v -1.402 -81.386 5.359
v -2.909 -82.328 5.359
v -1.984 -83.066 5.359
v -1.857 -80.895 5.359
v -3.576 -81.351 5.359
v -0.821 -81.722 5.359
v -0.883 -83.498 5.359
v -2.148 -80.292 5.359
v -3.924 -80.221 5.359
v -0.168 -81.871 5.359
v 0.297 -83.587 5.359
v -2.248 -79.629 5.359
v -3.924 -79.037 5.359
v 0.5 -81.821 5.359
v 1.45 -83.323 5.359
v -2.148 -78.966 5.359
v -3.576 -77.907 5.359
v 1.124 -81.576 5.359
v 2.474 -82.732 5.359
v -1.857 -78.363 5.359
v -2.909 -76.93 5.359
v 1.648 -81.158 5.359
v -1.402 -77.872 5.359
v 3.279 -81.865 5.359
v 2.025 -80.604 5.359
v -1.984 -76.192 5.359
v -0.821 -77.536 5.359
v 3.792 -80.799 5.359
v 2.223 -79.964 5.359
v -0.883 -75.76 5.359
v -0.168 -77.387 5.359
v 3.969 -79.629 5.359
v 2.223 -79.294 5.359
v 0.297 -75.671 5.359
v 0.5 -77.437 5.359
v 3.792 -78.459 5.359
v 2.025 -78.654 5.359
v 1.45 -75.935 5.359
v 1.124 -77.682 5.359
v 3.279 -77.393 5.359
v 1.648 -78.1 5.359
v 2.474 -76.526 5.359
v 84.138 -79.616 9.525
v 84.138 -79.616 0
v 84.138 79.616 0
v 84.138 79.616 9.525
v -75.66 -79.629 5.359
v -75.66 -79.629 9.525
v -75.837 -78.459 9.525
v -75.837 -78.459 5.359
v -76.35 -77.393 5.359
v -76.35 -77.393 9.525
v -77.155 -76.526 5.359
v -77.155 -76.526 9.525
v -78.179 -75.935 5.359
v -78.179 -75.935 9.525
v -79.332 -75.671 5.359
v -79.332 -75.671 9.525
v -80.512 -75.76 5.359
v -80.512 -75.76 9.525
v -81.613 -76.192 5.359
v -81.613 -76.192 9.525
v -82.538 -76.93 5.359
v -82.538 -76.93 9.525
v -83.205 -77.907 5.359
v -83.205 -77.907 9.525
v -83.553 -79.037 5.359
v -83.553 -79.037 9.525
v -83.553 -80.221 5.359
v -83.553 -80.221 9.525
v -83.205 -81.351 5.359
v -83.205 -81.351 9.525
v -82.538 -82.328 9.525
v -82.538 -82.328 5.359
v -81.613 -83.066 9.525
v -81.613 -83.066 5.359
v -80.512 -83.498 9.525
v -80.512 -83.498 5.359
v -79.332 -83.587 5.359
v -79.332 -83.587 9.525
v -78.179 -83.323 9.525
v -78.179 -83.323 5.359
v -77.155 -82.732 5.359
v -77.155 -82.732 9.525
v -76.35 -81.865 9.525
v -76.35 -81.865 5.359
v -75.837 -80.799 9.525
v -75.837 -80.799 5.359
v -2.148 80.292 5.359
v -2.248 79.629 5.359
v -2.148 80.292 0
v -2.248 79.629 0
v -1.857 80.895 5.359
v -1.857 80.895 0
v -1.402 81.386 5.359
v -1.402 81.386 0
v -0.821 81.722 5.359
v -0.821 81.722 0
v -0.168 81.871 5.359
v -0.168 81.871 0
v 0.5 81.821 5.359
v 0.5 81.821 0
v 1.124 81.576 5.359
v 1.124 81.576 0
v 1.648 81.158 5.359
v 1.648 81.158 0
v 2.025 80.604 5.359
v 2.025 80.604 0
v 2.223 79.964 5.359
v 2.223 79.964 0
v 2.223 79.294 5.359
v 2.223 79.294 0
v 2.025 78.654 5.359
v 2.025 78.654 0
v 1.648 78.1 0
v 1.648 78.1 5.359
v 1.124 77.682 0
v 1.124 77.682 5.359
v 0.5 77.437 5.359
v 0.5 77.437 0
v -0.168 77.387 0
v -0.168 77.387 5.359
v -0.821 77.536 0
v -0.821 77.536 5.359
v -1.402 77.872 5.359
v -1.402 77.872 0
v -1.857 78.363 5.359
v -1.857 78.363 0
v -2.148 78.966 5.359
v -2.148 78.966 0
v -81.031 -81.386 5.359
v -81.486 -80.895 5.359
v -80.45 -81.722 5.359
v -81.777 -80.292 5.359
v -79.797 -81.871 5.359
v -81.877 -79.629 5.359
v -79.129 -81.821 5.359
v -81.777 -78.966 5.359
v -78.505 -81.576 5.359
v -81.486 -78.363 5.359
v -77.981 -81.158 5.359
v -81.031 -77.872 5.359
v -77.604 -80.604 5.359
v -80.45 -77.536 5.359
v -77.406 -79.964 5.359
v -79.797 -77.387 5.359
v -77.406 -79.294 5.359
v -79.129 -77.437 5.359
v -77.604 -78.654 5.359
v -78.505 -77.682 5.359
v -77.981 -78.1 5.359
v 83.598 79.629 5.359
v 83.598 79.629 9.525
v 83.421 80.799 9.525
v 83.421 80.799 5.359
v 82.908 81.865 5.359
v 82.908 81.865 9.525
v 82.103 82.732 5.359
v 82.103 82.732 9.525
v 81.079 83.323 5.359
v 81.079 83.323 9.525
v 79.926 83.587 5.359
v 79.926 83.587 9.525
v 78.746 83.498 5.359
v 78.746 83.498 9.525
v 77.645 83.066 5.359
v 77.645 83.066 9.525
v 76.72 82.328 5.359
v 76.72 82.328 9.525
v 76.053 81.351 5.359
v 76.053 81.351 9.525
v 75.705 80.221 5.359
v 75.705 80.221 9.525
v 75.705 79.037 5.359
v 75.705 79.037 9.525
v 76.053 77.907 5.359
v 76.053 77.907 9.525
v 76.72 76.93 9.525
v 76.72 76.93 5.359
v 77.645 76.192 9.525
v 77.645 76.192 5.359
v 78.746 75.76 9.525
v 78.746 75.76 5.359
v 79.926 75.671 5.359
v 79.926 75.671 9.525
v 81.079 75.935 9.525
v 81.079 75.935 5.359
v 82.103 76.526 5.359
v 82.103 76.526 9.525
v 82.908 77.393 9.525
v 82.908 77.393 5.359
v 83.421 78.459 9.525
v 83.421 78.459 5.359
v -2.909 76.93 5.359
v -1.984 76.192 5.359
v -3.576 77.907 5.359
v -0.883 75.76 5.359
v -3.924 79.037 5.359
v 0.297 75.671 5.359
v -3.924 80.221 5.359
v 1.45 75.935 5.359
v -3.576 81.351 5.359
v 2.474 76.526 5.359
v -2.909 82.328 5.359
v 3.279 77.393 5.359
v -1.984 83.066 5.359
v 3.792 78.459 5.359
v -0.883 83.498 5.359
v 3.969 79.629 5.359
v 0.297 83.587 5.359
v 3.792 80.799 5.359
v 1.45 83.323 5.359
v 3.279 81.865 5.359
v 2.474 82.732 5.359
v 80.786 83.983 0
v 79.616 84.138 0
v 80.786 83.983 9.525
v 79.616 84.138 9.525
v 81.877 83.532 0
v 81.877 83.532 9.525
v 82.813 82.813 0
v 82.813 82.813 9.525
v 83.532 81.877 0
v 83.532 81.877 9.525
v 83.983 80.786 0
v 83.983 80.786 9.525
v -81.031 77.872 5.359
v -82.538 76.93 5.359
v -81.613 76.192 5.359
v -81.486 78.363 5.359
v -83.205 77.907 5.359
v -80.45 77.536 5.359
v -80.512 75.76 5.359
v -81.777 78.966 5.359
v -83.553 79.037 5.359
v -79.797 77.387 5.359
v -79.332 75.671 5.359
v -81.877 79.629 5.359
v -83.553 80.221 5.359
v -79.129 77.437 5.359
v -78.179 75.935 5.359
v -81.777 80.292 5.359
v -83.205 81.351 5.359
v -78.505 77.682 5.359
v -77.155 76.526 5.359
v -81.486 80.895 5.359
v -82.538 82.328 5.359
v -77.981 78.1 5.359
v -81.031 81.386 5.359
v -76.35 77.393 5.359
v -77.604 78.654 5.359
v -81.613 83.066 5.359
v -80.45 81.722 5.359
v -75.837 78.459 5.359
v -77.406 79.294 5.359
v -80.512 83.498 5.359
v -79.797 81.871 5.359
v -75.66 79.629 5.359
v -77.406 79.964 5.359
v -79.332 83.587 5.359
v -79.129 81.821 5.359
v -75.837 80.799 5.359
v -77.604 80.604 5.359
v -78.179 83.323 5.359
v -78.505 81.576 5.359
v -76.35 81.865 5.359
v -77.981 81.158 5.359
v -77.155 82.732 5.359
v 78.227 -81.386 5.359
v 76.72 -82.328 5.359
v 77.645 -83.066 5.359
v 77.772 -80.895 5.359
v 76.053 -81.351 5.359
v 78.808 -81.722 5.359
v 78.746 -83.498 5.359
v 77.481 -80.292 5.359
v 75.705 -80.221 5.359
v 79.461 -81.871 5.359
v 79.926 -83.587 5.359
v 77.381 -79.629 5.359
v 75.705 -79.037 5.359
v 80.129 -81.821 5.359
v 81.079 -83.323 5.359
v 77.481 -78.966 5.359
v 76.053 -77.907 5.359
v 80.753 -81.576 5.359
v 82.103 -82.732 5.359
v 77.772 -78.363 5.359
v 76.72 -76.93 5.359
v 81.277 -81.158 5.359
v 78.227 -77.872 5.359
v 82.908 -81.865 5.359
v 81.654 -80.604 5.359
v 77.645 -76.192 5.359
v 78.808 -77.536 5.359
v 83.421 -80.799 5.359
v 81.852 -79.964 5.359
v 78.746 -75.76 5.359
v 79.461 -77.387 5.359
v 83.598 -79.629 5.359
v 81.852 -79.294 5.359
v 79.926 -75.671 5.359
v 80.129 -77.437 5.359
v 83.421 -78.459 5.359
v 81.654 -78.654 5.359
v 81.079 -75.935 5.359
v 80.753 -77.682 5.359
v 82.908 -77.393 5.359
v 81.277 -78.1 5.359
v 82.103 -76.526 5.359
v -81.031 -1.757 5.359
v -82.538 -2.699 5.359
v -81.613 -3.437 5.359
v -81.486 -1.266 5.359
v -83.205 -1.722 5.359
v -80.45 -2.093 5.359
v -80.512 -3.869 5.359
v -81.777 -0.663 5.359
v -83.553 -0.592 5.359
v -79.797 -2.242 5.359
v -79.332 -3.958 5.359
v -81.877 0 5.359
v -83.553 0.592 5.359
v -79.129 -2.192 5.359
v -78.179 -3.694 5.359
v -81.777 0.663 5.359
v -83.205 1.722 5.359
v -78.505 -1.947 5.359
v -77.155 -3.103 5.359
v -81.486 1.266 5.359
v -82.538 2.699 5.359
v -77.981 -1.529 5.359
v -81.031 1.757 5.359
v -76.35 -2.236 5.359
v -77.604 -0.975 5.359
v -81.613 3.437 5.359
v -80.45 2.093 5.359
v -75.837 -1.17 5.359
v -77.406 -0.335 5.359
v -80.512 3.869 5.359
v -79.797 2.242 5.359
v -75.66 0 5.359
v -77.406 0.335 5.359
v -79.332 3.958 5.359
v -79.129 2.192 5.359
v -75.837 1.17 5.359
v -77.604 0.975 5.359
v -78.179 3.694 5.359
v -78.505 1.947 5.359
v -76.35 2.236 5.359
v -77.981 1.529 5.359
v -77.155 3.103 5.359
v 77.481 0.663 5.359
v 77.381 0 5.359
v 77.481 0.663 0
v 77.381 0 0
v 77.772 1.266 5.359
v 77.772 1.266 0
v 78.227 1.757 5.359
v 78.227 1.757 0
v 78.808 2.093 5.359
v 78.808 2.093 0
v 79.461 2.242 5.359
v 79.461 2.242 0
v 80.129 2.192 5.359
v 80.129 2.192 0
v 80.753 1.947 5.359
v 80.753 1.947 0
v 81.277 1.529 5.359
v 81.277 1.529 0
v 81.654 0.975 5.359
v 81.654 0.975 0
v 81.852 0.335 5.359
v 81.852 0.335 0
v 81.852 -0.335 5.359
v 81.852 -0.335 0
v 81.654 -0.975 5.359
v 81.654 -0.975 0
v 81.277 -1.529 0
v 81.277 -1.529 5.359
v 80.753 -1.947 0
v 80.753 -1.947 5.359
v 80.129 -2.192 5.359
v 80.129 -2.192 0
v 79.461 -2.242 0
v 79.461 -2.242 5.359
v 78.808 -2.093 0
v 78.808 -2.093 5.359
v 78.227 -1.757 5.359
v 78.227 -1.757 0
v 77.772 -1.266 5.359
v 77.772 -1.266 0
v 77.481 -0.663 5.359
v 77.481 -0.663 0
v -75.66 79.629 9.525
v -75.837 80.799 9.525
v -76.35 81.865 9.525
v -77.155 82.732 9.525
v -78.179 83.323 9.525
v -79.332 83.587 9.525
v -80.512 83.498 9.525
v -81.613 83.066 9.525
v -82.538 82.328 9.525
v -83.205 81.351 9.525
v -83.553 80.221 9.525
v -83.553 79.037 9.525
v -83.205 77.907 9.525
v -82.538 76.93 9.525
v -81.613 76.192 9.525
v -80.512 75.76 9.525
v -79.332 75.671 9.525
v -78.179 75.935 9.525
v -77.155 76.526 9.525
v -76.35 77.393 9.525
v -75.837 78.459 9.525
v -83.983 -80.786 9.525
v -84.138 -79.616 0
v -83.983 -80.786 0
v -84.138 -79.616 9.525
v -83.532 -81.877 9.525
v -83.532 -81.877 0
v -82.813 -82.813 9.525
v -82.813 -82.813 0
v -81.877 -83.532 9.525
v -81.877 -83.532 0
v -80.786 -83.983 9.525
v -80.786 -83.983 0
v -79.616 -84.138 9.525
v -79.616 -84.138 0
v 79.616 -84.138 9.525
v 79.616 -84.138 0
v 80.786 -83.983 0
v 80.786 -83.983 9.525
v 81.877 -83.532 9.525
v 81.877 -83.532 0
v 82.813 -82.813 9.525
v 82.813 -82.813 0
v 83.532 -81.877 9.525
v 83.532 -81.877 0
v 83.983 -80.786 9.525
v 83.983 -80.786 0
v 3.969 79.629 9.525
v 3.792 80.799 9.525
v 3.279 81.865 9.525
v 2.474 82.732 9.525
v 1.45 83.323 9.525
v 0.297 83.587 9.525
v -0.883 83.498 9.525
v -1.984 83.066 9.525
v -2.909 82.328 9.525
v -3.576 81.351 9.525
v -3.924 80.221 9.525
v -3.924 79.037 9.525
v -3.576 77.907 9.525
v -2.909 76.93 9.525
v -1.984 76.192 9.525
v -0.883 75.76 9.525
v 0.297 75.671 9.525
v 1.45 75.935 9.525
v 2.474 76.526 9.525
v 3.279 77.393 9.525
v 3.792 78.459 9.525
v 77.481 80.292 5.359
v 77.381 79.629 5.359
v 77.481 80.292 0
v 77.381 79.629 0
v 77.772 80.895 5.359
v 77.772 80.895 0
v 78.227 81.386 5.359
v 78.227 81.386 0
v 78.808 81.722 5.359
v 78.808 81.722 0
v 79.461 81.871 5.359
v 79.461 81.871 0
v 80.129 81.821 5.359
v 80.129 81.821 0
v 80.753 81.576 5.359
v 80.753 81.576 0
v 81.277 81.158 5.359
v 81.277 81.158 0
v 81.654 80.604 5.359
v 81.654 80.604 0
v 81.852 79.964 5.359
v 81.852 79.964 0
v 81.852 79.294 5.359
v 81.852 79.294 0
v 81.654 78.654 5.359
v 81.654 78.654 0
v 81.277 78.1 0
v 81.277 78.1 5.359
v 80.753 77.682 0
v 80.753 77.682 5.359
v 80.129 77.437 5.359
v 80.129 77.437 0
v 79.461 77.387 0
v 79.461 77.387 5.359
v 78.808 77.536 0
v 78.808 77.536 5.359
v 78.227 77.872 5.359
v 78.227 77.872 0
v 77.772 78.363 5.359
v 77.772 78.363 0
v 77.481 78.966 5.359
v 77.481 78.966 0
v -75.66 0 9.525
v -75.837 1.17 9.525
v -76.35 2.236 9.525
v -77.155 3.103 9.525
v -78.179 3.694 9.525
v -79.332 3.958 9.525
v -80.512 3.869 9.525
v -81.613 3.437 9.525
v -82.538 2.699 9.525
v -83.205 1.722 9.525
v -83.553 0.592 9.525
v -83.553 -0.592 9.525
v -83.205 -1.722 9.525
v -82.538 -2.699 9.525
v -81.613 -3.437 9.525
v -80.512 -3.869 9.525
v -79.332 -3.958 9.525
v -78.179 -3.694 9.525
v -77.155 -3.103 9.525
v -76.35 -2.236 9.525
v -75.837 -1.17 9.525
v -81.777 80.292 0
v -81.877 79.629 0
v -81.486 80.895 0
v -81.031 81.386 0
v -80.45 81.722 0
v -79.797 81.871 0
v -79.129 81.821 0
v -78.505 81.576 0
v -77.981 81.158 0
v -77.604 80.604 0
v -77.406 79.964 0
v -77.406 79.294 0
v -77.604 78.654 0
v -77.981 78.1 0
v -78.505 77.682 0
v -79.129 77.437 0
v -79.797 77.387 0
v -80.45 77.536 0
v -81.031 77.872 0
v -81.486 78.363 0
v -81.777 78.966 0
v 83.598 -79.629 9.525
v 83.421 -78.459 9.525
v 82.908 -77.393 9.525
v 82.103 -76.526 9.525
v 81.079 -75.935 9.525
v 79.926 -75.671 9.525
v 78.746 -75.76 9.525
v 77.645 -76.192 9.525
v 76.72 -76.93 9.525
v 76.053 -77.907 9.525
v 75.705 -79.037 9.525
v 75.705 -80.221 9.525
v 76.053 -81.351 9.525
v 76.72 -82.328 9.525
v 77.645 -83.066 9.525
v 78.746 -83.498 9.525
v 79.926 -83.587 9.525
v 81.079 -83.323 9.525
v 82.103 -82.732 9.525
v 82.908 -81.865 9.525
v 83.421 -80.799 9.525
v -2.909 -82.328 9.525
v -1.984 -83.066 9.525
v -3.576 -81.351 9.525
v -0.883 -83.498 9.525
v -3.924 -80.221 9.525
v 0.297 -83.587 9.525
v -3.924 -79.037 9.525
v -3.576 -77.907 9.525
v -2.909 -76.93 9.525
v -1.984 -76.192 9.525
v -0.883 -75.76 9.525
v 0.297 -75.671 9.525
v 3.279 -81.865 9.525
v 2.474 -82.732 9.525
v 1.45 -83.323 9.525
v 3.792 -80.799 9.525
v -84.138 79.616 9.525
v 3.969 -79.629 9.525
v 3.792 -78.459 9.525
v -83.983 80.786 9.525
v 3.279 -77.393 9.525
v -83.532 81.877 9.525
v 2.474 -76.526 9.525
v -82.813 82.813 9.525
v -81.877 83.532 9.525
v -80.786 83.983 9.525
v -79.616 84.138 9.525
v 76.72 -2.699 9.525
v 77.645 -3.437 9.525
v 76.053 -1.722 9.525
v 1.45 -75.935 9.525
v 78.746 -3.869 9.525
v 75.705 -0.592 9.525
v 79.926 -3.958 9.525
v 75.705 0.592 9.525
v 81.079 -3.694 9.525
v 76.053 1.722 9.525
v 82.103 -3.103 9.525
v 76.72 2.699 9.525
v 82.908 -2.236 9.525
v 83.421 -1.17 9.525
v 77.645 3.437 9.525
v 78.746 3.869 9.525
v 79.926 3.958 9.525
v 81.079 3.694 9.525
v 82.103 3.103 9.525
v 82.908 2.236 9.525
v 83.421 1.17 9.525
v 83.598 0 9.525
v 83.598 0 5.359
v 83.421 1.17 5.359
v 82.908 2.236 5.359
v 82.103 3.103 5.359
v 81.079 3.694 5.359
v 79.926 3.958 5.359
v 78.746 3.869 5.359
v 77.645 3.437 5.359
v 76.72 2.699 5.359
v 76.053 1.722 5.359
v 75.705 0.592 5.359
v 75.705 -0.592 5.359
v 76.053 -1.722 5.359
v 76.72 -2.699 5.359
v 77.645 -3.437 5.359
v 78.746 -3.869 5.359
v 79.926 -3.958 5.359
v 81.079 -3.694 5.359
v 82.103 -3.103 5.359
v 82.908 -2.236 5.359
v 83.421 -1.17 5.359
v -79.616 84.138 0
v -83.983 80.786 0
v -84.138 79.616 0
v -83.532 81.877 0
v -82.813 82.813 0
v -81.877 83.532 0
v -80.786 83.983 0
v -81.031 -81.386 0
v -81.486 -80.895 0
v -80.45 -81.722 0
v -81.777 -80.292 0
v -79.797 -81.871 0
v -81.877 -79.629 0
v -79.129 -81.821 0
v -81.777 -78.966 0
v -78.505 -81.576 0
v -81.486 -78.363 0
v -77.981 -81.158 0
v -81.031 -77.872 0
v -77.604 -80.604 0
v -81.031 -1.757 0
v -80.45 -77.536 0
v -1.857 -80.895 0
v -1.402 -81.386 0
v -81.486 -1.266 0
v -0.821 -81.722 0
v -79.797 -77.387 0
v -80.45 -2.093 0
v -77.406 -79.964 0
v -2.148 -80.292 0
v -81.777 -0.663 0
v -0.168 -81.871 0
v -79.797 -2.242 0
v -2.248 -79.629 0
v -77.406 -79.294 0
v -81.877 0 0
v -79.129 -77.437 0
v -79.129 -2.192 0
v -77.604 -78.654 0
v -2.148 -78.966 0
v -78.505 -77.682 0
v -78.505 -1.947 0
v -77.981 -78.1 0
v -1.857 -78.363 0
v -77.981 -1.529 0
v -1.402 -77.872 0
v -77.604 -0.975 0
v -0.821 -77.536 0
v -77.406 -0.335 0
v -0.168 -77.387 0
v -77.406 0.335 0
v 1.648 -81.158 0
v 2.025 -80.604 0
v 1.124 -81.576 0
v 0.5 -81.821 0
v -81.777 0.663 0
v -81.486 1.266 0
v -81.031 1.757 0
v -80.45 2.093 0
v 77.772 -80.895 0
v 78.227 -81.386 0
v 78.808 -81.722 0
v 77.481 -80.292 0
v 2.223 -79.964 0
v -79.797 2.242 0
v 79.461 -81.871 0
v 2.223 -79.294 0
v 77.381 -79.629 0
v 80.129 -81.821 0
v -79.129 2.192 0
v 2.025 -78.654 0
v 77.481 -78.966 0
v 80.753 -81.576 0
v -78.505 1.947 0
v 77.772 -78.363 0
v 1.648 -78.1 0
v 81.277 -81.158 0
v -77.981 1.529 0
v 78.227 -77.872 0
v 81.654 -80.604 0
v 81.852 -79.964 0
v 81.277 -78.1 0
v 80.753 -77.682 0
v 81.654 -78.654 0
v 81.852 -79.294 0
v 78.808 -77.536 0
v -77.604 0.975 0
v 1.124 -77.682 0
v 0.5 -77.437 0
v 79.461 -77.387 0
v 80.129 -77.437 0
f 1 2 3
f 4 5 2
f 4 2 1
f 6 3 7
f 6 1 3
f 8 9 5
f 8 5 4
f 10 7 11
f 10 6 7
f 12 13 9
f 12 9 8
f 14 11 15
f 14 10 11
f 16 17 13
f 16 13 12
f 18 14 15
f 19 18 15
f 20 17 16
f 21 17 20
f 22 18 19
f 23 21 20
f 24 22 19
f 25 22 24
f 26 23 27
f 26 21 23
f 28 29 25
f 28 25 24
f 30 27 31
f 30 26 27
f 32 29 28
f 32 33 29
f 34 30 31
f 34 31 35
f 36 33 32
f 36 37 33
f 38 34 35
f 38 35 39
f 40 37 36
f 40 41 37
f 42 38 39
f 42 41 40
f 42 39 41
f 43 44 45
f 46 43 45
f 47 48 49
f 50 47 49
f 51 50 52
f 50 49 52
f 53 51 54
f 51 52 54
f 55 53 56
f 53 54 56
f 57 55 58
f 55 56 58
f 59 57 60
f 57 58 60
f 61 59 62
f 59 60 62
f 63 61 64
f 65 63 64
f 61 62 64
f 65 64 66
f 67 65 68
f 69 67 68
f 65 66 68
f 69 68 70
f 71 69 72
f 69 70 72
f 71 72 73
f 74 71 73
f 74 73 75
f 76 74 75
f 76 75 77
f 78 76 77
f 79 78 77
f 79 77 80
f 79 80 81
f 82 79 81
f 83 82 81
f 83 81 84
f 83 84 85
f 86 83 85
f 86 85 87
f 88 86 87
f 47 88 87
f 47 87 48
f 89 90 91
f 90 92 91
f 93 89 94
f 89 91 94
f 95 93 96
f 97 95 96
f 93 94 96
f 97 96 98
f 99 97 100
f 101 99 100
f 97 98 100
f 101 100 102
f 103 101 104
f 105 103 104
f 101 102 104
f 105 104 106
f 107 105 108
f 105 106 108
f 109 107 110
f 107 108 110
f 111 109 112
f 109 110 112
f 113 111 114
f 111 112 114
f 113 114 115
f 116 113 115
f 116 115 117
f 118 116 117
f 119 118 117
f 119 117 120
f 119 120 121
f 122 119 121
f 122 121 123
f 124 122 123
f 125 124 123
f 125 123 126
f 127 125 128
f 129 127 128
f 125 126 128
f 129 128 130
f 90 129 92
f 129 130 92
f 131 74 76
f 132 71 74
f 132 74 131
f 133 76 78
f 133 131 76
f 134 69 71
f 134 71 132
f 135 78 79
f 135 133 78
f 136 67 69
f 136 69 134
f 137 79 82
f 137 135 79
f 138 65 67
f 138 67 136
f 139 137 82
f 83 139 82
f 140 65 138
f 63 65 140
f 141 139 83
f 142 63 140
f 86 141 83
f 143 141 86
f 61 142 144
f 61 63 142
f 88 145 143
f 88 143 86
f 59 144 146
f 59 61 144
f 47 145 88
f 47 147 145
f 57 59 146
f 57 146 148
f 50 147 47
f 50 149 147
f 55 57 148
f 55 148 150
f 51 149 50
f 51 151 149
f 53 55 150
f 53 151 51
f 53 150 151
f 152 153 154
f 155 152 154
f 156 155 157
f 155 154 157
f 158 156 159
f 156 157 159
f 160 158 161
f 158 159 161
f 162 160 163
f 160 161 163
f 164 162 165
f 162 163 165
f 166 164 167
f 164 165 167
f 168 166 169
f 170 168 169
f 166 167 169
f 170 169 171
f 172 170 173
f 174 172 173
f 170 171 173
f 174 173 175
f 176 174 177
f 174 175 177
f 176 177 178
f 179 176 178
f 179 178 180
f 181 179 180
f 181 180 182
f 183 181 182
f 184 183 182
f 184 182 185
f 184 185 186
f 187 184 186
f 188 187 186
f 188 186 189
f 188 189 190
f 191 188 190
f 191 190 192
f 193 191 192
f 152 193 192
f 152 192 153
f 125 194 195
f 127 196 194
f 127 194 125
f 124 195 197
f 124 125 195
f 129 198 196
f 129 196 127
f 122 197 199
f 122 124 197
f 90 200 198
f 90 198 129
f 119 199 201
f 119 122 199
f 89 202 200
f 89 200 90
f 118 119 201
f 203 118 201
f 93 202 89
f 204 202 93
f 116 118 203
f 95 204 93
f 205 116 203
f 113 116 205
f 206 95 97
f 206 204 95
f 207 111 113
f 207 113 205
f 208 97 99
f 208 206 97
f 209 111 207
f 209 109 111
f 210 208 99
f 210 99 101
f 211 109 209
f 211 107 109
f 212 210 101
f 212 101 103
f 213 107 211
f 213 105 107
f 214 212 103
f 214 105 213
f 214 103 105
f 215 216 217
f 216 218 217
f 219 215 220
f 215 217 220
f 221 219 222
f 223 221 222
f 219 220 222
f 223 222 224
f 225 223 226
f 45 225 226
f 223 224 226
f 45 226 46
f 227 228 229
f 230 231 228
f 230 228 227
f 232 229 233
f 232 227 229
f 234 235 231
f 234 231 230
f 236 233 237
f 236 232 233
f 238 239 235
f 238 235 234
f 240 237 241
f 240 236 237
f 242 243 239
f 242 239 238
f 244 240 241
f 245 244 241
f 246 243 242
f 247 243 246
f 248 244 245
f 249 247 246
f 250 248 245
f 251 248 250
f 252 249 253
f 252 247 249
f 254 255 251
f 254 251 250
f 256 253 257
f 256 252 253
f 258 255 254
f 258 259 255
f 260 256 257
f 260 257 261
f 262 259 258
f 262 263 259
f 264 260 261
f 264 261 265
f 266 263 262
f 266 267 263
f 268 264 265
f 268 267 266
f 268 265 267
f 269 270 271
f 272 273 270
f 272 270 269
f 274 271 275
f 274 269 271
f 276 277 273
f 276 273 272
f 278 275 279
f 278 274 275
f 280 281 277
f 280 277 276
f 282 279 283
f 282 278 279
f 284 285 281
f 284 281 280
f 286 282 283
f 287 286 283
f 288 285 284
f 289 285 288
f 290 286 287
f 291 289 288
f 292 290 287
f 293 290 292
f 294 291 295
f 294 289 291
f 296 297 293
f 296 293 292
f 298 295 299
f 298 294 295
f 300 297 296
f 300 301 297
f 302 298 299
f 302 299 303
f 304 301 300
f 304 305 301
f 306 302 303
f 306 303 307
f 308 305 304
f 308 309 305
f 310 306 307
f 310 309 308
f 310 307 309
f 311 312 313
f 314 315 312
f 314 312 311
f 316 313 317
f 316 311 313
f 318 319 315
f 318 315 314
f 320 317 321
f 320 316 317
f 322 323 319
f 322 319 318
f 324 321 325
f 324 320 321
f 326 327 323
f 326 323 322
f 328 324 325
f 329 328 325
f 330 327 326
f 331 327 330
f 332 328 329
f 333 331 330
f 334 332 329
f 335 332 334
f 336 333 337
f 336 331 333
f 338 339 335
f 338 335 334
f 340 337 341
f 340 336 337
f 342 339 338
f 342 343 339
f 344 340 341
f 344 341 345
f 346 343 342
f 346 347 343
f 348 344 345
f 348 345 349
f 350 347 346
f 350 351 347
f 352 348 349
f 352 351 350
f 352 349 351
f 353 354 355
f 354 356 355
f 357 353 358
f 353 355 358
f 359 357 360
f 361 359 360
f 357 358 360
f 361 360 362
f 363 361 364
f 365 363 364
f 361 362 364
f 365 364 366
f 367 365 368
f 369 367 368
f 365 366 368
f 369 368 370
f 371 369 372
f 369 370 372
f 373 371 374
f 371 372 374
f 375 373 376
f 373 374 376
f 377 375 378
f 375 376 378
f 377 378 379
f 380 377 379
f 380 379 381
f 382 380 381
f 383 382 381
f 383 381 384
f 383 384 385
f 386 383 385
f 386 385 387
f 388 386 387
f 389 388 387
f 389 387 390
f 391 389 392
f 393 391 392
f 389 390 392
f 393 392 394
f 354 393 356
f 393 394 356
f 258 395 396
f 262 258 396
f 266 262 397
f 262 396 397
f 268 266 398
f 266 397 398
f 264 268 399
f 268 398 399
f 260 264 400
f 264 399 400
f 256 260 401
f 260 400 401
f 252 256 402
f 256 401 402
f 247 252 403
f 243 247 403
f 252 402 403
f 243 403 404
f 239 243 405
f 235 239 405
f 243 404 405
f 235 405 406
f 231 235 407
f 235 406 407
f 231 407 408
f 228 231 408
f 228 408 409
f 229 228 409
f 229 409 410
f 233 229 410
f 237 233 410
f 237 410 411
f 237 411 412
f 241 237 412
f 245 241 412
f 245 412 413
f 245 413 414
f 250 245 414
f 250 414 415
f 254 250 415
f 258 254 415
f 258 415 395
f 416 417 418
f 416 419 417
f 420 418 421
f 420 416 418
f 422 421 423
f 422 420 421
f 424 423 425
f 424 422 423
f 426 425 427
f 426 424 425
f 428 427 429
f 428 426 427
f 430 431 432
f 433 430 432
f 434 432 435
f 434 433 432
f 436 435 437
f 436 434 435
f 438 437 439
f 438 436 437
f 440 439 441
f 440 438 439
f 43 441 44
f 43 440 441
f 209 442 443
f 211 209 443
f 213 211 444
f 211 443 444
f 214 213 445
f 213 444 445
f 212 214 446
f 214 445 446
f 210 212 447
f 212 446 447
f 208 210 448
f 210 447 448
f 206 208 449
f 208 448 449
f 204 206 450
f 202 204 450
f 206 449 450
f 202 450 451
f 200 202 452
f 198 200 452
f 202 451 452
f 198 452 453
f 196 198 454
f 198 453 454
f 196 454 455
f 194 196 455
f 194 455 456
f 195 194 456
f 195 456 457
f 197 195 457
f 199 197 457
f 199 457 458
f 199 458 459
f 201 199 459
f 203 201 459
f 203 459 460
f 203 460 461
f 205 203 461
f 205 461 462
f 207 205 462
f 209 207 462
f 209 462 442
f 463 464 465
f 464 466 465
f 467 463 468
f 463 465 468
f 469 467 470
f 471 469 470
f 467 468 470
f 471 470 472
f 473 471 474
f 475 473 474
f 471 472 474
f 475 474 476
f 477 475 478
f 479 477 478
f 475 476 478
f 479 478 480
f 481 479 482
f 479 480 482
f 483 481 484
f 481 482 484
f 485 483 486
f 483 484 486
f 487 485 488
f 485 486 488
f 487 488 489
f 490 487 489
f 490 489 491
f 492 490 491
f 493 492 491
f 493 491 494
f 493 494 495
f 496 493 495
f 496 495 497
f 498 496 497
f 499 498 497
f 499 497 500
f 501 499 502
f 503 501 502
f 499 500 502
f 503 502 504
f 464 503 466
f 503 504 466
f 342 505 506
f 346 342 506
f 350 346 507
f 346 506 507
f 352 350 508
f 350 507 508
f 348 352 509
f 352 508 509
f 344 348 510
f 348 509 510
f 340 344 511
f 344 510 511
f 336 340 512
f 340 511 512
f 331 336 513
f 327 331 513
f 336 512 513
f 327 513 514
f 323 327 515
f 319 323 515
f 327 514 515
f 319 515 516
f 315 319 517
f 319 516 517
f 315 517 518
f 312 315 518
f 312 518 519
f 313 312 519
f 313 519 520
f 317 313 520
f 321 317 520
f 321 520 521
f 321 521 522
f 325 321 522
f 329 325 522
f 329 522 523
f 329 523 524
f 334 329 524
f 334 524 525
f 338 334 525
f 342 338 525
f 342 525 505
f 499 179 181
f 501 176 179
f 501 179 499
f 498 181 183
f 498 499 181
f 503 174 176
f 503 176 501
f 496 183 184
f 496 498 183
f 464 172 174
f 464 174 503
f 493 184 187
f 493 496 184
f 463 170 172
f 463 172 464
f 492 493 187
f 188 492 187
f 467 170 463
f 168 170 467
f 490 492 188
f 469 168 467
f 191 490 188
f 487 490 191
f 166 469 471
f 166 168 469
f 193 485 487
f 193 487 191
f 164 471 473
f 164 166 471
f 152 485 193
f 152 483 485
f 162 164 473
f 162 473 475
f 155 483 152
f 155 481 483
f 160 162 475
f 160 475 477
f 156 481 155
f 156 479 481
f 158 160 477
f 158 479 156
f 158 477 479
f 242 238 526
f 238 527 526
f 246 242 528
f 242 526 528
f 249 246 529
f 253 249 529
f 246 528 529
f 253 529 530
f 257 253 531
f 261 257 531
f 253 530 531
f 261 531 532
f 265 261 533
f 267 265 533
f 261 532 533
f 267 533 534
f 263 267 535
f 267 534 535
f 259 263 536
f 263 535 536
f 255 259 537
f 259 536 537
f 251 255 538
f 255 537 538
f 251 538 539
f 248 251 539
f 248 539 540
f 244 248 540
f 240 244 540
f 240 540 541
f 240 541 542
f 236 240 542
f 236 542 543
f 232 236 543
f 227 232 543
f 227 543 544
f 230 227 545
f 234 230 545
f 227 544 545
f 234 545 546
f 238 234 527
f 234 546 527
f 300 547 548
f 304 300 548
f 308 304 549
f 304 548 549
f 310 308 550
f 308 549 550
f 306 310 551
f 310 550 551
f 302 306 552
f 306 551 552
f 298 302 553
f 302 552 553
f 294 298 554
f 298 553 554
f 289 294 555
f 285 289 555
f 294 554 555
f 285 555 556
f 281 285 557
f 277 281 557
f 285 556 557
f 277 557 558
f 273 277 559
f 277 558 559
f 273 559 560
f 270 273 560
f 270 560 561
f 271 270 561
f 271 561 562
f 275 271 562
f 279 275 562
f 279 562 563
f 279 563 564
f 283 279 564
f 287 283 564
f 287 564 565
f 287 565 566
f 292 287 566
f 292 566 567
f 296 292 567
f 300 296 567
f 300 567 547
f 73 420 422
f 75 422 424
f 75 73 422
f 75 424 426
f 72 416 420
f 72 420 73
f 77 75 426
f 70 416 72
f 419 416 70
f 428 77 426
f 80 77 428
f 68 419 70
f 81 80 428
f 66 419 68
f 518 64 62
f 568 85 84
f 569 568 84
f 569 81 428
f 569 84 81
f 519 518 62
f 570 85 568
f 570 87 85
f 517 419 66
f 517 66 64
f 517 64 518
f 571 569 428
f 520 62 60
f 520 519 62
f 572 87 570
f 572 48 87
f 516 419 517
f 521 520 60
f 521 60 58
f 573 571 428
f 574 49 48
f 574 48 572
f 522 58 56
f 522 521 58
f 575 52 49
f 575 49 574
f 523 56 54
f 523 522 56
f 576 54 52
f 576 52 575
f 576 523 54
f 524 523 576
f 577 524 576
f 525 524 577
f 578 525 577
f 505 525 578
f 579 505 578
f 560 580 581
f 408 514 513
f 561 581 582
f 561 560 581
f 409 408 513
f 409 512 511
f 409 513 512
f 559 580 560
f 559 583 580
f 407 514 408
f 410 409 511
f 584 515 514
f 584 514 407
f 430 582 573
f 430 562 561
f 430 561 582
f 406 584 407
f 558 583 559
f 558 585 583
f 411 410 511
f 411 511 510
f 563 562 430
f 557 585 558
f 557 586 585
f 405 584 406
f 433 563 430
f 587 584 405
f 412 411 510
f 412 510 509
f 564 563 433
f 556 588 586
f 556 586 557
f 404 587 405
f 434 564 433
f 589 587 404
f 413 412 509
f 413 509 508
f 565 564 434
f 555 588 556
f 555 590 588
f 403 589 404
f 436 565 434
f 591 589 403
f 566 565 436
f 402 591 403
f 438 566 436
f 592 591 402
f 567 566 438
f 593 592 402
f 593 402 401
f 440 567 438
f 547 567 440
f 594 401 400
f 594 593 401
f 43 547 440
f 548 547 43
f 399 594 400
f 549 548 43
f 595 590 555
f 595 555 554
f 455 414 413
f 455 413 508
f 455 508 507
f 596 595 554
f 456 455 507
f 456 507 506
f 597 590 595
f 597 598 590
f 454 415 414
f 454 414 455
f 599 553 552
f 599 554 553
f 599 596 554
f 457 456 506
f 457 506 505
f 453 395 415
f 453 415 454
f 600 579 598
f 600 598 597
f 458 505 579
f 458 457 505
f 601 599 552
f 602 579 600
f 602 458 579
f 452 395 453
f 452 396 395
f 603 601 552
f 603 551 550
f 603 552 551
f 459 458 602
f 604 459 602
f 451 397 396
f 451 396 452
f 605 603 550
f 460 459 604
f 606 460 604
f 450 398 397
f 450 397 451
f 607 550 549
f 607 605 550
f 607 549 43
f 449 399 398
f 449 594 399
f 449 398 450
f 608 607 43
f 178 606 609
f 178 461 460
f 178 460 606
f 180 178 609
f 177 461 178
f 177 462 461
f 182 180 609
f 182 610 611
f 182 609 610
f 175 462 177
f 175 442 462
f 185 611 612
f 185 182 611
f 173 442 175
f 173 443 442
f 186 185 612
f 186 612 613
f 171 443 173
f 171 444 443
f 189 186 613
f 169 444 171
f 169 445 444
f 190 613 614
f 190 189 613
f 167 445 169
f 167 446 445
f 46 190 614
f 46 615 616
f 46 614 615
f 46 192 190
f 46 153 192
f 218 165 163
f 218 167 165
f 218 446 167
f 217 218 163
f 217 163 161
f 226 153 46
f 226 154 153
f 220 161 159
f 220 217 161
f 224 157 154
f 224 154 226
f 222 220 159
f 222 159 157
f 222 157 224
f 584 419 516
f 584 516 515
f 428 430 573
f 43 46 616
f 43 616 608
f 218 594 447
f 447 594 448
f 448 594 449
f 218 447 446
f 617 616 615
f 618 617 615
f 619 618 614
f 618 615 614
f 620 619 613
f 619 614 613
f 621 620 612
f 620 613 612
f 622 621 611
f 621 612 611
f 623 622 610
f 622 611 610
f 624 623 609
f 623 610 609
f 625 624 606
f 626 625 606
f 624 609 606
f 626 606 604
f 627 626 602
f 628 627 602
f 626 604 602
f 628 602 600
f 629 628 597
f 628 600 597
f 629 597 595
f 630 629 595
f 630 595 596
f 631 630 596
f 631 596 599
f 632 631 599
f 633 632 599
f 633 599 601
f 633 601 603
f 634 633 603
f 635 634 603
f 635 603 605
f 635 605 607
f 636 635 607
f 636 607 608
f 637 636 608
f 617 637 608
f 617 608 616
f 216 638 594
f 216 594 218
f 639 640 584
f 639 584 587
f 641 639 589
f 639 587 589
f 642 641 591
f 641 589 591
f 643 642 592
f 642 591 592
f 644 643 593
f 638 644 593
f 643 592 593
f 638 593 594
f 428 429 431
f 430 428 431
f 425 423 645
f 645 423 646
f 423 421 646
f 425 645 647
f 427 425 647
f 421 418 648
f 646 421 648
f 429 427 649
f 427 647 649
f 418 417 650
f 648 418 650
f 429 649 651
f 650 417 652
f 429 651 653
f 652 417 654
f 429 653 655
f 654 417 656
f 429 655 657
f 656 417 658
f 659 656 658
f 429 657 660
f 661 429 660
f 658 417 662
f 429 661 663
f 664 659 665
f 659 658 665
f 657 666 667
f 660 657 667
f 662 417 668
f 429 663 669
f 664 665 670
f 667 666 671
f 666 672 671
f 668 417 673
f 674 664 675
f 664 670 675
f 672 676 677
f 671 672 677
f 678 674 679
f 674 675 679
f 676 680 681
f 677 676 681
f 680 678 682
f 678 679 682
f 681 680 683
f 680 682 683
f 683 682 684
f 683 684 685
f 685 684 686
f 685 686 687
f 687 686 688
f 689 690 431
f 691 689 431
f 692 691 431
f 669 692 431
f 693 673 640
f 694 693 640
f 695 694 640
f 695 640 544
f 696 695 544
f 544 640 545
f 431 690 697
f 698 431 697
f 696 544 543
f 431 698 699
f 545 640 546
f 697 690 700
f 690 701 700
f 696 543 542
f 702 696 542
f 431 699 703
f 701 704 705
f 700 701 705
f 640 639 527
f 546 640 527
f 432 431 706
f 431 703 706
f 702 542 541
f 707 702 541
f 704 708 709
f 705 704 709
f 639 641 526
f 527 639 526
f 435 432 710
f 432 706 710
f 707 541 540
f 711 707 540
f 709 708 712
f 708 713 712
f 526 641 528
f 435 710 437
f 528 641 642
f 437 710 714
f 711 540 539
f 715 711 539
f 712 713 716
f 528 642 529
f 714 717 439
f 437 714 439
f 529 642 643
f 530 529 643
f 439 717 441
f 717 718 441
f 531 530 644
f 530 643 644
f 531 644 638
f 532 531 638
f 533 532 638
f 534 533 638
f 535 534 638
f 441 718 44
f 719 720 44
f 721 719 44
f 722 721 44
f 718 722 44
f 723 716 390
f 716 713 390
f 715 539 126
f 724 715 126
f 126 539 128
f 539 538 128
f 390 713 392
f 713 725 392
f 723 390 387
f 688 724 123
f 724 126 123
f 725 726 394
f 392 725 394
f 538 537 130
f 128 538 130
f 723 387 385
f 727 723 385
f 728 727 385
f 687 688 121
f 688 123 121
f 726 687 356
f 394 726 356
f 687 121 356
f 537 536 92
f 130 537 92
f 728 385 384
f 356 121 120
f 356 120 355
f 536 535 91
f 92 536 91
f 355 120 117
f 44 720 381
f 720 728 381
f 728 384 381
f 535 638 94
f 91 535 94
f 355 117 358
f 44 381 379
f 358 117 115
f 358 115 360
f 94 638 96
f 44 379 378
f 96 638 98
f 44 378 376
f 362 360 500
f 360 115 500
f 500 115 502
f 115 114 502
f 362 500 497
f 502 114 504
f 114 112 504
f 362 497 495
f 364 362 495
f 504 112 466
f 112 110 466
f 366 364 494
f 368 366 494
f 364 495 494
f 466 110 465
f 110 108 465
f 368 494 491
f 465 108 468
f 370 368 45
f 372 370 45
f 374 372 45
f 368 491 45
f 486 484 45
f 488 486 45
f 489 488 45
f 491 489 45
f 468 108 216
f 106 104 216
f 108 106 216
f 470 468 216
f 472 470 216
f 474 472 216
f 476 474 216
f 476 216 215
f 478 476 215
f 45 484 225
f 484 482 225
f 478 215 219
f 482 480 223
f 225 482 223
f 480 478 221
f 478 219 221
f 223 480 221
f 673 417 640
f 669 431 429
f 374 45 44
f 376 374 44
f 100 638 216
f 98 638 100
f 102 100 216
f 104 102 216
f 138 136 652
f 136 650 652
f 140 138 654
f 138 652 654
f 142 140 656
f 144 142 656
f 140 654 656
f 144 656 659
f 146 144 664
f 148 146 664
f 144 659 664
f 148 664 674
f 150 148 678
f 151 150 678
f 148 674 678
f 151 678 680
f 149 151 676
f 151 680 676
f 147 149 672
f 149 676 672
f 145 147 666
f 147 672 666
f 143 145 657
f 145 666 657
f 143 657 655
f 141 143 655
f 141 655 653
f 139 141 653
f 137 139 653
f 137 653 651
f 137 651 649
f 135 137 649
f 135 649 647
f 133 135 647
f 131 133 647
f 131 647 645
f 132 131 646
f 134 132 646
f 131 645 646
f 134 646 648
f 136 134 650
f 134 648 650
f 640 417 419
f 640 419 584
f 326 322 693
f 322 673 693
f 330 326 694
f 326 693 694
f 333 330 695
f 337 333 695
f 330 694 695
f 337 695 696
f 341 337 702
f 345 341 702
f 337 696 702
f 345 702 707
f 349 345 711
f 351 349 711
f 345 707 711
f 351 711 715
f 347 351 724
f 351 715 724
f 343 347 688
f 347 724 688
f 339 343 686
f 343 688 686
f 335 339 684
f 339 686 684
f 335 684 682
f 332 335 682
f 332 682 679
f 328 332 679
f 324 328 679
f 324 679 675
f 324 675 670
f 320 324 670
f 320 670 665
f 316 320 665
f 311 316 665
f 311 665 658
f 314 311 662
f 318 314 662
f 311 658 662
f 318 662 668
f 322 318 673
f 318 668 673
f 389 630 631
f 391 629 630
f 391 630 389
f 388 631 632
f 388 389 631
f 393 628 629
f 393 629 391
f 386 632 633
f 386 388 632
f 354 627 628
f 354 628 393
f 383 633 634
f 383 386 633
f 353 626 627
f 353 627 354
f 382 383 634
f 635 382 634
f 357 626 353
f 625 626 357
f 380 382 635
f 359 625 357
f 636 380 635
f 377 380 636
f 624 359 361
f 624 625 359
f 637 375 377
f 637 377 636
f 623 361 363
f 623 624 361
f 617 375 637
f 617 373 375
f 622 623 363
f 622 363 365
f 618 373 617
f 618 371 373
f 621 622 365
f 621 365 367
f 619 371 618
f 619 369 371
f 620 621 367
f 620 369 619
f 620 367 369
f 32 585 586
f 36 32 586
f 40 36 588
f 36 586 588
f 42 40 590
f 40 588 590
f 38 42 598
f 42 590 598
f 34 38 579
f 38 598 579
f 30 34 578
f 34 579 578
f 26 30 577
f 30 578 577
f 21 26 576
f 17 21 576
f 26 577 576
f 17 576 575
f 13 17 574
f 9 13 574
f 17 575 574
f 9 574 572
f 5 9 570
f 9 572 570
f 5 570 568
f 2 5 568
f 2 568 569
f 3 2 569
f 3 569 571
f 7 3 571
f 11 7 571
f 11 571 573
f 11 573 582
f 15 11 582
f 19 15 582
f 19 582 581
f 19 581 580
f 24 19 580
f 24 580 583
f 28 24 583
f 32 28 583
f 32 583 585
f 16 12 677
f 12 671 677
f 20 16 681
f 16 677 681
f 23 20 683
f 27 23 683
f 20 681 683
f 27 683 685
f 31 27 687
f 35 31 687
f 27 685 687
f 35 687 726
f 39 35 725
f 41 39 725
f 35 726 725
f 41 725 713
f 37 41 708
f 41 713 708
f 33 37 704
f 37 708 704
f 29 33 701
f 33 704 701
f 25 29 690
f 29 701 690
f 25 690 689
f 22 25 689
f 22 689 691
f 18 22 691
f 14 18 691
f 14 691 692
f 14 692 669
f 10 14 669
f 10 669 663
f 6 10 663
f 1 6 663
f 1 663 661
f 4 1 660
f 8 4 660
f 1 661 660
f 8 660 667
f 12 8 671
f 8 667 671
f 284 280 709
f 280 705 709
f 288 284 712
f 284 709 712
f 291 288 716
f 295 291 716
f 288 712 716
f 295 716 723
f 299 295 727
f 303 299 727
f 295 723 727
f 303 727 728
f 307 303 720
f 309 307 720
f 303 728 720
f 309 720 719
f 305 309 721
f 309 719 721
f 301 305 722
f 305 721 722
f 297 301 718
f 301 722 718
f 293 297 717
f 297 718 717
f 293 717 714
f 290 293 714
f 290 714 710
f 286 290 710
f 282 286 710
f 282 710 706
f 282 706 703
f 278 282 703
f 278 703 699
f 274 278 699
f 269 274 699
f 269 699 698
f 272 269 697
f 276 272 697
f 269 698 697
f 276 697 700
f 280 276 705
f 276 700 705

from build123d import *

# Parameters (mm, degrees)
SKETCH1_W                                      = 168.275
SKETCH1_H                                      = 168.275
BOSS_EXTRUDE1_DEPTH                            = 9.525
CBORE_FOR_8_SOCKET_HEAD_CAP_SCREW1_D           = 4.4958
CBORE_FOR_8_SOCKET_HEAD_CAP_SCREW1_CBORE_D     = 7.9375
CBORE_FOR_8_SOCKET_HEAD_CAP_SCREW1_CBORE_DEPTH = 4.1656
FILLET1_R                                      = 4.5212


with BuildPart() as part:
    # Sketch1 → Boss-Extrude1 (new body)
    with BuildSketch(Plane.XY):
        Rectangle(SKETCH1_W, SKETCH1_H)
    extrude(amount=BOSS_EXTRUDE1_DEPTH)

    # CBORE for #8 Socket Head Cap Screw1 (through all)
    with Locations(Plane.XY.offset(9.525)):
        with Locations((-79.629, 79.629), (0, 79.629), (79.629, 79.629), (79.629, 0), (0, -79.629), (79.629, -79.629), (-79.629, 0), (-79.629, -79.629)):
            CounterBoreHole(CBORE_FOR_8_SOCKET_HEAD_CAP_SCREW1_D / 2, CBORE_FOR_8_SOCKET_HEAD_CAP_SCREW1_CBORE_D / 2, CBORE_FOR_8_SOCKET_HEAD_CAP_SCREW1_CBORE_DEPTH)

    # Fillet1
    fillet1_edges = [part.edges().sort_by_distance(p)[0] for p in [
        (-84.1375, 84.1375, 4.7625),
        (84.1375, 84.1375, 4.7625),
        (84.1375, -84.1375, 4.7625),
        (-84.1375, -84.1375, 4.7625),
    ]]
    fillet(fillet1_edges, radius=FILLET1_R)


solid = part.part
